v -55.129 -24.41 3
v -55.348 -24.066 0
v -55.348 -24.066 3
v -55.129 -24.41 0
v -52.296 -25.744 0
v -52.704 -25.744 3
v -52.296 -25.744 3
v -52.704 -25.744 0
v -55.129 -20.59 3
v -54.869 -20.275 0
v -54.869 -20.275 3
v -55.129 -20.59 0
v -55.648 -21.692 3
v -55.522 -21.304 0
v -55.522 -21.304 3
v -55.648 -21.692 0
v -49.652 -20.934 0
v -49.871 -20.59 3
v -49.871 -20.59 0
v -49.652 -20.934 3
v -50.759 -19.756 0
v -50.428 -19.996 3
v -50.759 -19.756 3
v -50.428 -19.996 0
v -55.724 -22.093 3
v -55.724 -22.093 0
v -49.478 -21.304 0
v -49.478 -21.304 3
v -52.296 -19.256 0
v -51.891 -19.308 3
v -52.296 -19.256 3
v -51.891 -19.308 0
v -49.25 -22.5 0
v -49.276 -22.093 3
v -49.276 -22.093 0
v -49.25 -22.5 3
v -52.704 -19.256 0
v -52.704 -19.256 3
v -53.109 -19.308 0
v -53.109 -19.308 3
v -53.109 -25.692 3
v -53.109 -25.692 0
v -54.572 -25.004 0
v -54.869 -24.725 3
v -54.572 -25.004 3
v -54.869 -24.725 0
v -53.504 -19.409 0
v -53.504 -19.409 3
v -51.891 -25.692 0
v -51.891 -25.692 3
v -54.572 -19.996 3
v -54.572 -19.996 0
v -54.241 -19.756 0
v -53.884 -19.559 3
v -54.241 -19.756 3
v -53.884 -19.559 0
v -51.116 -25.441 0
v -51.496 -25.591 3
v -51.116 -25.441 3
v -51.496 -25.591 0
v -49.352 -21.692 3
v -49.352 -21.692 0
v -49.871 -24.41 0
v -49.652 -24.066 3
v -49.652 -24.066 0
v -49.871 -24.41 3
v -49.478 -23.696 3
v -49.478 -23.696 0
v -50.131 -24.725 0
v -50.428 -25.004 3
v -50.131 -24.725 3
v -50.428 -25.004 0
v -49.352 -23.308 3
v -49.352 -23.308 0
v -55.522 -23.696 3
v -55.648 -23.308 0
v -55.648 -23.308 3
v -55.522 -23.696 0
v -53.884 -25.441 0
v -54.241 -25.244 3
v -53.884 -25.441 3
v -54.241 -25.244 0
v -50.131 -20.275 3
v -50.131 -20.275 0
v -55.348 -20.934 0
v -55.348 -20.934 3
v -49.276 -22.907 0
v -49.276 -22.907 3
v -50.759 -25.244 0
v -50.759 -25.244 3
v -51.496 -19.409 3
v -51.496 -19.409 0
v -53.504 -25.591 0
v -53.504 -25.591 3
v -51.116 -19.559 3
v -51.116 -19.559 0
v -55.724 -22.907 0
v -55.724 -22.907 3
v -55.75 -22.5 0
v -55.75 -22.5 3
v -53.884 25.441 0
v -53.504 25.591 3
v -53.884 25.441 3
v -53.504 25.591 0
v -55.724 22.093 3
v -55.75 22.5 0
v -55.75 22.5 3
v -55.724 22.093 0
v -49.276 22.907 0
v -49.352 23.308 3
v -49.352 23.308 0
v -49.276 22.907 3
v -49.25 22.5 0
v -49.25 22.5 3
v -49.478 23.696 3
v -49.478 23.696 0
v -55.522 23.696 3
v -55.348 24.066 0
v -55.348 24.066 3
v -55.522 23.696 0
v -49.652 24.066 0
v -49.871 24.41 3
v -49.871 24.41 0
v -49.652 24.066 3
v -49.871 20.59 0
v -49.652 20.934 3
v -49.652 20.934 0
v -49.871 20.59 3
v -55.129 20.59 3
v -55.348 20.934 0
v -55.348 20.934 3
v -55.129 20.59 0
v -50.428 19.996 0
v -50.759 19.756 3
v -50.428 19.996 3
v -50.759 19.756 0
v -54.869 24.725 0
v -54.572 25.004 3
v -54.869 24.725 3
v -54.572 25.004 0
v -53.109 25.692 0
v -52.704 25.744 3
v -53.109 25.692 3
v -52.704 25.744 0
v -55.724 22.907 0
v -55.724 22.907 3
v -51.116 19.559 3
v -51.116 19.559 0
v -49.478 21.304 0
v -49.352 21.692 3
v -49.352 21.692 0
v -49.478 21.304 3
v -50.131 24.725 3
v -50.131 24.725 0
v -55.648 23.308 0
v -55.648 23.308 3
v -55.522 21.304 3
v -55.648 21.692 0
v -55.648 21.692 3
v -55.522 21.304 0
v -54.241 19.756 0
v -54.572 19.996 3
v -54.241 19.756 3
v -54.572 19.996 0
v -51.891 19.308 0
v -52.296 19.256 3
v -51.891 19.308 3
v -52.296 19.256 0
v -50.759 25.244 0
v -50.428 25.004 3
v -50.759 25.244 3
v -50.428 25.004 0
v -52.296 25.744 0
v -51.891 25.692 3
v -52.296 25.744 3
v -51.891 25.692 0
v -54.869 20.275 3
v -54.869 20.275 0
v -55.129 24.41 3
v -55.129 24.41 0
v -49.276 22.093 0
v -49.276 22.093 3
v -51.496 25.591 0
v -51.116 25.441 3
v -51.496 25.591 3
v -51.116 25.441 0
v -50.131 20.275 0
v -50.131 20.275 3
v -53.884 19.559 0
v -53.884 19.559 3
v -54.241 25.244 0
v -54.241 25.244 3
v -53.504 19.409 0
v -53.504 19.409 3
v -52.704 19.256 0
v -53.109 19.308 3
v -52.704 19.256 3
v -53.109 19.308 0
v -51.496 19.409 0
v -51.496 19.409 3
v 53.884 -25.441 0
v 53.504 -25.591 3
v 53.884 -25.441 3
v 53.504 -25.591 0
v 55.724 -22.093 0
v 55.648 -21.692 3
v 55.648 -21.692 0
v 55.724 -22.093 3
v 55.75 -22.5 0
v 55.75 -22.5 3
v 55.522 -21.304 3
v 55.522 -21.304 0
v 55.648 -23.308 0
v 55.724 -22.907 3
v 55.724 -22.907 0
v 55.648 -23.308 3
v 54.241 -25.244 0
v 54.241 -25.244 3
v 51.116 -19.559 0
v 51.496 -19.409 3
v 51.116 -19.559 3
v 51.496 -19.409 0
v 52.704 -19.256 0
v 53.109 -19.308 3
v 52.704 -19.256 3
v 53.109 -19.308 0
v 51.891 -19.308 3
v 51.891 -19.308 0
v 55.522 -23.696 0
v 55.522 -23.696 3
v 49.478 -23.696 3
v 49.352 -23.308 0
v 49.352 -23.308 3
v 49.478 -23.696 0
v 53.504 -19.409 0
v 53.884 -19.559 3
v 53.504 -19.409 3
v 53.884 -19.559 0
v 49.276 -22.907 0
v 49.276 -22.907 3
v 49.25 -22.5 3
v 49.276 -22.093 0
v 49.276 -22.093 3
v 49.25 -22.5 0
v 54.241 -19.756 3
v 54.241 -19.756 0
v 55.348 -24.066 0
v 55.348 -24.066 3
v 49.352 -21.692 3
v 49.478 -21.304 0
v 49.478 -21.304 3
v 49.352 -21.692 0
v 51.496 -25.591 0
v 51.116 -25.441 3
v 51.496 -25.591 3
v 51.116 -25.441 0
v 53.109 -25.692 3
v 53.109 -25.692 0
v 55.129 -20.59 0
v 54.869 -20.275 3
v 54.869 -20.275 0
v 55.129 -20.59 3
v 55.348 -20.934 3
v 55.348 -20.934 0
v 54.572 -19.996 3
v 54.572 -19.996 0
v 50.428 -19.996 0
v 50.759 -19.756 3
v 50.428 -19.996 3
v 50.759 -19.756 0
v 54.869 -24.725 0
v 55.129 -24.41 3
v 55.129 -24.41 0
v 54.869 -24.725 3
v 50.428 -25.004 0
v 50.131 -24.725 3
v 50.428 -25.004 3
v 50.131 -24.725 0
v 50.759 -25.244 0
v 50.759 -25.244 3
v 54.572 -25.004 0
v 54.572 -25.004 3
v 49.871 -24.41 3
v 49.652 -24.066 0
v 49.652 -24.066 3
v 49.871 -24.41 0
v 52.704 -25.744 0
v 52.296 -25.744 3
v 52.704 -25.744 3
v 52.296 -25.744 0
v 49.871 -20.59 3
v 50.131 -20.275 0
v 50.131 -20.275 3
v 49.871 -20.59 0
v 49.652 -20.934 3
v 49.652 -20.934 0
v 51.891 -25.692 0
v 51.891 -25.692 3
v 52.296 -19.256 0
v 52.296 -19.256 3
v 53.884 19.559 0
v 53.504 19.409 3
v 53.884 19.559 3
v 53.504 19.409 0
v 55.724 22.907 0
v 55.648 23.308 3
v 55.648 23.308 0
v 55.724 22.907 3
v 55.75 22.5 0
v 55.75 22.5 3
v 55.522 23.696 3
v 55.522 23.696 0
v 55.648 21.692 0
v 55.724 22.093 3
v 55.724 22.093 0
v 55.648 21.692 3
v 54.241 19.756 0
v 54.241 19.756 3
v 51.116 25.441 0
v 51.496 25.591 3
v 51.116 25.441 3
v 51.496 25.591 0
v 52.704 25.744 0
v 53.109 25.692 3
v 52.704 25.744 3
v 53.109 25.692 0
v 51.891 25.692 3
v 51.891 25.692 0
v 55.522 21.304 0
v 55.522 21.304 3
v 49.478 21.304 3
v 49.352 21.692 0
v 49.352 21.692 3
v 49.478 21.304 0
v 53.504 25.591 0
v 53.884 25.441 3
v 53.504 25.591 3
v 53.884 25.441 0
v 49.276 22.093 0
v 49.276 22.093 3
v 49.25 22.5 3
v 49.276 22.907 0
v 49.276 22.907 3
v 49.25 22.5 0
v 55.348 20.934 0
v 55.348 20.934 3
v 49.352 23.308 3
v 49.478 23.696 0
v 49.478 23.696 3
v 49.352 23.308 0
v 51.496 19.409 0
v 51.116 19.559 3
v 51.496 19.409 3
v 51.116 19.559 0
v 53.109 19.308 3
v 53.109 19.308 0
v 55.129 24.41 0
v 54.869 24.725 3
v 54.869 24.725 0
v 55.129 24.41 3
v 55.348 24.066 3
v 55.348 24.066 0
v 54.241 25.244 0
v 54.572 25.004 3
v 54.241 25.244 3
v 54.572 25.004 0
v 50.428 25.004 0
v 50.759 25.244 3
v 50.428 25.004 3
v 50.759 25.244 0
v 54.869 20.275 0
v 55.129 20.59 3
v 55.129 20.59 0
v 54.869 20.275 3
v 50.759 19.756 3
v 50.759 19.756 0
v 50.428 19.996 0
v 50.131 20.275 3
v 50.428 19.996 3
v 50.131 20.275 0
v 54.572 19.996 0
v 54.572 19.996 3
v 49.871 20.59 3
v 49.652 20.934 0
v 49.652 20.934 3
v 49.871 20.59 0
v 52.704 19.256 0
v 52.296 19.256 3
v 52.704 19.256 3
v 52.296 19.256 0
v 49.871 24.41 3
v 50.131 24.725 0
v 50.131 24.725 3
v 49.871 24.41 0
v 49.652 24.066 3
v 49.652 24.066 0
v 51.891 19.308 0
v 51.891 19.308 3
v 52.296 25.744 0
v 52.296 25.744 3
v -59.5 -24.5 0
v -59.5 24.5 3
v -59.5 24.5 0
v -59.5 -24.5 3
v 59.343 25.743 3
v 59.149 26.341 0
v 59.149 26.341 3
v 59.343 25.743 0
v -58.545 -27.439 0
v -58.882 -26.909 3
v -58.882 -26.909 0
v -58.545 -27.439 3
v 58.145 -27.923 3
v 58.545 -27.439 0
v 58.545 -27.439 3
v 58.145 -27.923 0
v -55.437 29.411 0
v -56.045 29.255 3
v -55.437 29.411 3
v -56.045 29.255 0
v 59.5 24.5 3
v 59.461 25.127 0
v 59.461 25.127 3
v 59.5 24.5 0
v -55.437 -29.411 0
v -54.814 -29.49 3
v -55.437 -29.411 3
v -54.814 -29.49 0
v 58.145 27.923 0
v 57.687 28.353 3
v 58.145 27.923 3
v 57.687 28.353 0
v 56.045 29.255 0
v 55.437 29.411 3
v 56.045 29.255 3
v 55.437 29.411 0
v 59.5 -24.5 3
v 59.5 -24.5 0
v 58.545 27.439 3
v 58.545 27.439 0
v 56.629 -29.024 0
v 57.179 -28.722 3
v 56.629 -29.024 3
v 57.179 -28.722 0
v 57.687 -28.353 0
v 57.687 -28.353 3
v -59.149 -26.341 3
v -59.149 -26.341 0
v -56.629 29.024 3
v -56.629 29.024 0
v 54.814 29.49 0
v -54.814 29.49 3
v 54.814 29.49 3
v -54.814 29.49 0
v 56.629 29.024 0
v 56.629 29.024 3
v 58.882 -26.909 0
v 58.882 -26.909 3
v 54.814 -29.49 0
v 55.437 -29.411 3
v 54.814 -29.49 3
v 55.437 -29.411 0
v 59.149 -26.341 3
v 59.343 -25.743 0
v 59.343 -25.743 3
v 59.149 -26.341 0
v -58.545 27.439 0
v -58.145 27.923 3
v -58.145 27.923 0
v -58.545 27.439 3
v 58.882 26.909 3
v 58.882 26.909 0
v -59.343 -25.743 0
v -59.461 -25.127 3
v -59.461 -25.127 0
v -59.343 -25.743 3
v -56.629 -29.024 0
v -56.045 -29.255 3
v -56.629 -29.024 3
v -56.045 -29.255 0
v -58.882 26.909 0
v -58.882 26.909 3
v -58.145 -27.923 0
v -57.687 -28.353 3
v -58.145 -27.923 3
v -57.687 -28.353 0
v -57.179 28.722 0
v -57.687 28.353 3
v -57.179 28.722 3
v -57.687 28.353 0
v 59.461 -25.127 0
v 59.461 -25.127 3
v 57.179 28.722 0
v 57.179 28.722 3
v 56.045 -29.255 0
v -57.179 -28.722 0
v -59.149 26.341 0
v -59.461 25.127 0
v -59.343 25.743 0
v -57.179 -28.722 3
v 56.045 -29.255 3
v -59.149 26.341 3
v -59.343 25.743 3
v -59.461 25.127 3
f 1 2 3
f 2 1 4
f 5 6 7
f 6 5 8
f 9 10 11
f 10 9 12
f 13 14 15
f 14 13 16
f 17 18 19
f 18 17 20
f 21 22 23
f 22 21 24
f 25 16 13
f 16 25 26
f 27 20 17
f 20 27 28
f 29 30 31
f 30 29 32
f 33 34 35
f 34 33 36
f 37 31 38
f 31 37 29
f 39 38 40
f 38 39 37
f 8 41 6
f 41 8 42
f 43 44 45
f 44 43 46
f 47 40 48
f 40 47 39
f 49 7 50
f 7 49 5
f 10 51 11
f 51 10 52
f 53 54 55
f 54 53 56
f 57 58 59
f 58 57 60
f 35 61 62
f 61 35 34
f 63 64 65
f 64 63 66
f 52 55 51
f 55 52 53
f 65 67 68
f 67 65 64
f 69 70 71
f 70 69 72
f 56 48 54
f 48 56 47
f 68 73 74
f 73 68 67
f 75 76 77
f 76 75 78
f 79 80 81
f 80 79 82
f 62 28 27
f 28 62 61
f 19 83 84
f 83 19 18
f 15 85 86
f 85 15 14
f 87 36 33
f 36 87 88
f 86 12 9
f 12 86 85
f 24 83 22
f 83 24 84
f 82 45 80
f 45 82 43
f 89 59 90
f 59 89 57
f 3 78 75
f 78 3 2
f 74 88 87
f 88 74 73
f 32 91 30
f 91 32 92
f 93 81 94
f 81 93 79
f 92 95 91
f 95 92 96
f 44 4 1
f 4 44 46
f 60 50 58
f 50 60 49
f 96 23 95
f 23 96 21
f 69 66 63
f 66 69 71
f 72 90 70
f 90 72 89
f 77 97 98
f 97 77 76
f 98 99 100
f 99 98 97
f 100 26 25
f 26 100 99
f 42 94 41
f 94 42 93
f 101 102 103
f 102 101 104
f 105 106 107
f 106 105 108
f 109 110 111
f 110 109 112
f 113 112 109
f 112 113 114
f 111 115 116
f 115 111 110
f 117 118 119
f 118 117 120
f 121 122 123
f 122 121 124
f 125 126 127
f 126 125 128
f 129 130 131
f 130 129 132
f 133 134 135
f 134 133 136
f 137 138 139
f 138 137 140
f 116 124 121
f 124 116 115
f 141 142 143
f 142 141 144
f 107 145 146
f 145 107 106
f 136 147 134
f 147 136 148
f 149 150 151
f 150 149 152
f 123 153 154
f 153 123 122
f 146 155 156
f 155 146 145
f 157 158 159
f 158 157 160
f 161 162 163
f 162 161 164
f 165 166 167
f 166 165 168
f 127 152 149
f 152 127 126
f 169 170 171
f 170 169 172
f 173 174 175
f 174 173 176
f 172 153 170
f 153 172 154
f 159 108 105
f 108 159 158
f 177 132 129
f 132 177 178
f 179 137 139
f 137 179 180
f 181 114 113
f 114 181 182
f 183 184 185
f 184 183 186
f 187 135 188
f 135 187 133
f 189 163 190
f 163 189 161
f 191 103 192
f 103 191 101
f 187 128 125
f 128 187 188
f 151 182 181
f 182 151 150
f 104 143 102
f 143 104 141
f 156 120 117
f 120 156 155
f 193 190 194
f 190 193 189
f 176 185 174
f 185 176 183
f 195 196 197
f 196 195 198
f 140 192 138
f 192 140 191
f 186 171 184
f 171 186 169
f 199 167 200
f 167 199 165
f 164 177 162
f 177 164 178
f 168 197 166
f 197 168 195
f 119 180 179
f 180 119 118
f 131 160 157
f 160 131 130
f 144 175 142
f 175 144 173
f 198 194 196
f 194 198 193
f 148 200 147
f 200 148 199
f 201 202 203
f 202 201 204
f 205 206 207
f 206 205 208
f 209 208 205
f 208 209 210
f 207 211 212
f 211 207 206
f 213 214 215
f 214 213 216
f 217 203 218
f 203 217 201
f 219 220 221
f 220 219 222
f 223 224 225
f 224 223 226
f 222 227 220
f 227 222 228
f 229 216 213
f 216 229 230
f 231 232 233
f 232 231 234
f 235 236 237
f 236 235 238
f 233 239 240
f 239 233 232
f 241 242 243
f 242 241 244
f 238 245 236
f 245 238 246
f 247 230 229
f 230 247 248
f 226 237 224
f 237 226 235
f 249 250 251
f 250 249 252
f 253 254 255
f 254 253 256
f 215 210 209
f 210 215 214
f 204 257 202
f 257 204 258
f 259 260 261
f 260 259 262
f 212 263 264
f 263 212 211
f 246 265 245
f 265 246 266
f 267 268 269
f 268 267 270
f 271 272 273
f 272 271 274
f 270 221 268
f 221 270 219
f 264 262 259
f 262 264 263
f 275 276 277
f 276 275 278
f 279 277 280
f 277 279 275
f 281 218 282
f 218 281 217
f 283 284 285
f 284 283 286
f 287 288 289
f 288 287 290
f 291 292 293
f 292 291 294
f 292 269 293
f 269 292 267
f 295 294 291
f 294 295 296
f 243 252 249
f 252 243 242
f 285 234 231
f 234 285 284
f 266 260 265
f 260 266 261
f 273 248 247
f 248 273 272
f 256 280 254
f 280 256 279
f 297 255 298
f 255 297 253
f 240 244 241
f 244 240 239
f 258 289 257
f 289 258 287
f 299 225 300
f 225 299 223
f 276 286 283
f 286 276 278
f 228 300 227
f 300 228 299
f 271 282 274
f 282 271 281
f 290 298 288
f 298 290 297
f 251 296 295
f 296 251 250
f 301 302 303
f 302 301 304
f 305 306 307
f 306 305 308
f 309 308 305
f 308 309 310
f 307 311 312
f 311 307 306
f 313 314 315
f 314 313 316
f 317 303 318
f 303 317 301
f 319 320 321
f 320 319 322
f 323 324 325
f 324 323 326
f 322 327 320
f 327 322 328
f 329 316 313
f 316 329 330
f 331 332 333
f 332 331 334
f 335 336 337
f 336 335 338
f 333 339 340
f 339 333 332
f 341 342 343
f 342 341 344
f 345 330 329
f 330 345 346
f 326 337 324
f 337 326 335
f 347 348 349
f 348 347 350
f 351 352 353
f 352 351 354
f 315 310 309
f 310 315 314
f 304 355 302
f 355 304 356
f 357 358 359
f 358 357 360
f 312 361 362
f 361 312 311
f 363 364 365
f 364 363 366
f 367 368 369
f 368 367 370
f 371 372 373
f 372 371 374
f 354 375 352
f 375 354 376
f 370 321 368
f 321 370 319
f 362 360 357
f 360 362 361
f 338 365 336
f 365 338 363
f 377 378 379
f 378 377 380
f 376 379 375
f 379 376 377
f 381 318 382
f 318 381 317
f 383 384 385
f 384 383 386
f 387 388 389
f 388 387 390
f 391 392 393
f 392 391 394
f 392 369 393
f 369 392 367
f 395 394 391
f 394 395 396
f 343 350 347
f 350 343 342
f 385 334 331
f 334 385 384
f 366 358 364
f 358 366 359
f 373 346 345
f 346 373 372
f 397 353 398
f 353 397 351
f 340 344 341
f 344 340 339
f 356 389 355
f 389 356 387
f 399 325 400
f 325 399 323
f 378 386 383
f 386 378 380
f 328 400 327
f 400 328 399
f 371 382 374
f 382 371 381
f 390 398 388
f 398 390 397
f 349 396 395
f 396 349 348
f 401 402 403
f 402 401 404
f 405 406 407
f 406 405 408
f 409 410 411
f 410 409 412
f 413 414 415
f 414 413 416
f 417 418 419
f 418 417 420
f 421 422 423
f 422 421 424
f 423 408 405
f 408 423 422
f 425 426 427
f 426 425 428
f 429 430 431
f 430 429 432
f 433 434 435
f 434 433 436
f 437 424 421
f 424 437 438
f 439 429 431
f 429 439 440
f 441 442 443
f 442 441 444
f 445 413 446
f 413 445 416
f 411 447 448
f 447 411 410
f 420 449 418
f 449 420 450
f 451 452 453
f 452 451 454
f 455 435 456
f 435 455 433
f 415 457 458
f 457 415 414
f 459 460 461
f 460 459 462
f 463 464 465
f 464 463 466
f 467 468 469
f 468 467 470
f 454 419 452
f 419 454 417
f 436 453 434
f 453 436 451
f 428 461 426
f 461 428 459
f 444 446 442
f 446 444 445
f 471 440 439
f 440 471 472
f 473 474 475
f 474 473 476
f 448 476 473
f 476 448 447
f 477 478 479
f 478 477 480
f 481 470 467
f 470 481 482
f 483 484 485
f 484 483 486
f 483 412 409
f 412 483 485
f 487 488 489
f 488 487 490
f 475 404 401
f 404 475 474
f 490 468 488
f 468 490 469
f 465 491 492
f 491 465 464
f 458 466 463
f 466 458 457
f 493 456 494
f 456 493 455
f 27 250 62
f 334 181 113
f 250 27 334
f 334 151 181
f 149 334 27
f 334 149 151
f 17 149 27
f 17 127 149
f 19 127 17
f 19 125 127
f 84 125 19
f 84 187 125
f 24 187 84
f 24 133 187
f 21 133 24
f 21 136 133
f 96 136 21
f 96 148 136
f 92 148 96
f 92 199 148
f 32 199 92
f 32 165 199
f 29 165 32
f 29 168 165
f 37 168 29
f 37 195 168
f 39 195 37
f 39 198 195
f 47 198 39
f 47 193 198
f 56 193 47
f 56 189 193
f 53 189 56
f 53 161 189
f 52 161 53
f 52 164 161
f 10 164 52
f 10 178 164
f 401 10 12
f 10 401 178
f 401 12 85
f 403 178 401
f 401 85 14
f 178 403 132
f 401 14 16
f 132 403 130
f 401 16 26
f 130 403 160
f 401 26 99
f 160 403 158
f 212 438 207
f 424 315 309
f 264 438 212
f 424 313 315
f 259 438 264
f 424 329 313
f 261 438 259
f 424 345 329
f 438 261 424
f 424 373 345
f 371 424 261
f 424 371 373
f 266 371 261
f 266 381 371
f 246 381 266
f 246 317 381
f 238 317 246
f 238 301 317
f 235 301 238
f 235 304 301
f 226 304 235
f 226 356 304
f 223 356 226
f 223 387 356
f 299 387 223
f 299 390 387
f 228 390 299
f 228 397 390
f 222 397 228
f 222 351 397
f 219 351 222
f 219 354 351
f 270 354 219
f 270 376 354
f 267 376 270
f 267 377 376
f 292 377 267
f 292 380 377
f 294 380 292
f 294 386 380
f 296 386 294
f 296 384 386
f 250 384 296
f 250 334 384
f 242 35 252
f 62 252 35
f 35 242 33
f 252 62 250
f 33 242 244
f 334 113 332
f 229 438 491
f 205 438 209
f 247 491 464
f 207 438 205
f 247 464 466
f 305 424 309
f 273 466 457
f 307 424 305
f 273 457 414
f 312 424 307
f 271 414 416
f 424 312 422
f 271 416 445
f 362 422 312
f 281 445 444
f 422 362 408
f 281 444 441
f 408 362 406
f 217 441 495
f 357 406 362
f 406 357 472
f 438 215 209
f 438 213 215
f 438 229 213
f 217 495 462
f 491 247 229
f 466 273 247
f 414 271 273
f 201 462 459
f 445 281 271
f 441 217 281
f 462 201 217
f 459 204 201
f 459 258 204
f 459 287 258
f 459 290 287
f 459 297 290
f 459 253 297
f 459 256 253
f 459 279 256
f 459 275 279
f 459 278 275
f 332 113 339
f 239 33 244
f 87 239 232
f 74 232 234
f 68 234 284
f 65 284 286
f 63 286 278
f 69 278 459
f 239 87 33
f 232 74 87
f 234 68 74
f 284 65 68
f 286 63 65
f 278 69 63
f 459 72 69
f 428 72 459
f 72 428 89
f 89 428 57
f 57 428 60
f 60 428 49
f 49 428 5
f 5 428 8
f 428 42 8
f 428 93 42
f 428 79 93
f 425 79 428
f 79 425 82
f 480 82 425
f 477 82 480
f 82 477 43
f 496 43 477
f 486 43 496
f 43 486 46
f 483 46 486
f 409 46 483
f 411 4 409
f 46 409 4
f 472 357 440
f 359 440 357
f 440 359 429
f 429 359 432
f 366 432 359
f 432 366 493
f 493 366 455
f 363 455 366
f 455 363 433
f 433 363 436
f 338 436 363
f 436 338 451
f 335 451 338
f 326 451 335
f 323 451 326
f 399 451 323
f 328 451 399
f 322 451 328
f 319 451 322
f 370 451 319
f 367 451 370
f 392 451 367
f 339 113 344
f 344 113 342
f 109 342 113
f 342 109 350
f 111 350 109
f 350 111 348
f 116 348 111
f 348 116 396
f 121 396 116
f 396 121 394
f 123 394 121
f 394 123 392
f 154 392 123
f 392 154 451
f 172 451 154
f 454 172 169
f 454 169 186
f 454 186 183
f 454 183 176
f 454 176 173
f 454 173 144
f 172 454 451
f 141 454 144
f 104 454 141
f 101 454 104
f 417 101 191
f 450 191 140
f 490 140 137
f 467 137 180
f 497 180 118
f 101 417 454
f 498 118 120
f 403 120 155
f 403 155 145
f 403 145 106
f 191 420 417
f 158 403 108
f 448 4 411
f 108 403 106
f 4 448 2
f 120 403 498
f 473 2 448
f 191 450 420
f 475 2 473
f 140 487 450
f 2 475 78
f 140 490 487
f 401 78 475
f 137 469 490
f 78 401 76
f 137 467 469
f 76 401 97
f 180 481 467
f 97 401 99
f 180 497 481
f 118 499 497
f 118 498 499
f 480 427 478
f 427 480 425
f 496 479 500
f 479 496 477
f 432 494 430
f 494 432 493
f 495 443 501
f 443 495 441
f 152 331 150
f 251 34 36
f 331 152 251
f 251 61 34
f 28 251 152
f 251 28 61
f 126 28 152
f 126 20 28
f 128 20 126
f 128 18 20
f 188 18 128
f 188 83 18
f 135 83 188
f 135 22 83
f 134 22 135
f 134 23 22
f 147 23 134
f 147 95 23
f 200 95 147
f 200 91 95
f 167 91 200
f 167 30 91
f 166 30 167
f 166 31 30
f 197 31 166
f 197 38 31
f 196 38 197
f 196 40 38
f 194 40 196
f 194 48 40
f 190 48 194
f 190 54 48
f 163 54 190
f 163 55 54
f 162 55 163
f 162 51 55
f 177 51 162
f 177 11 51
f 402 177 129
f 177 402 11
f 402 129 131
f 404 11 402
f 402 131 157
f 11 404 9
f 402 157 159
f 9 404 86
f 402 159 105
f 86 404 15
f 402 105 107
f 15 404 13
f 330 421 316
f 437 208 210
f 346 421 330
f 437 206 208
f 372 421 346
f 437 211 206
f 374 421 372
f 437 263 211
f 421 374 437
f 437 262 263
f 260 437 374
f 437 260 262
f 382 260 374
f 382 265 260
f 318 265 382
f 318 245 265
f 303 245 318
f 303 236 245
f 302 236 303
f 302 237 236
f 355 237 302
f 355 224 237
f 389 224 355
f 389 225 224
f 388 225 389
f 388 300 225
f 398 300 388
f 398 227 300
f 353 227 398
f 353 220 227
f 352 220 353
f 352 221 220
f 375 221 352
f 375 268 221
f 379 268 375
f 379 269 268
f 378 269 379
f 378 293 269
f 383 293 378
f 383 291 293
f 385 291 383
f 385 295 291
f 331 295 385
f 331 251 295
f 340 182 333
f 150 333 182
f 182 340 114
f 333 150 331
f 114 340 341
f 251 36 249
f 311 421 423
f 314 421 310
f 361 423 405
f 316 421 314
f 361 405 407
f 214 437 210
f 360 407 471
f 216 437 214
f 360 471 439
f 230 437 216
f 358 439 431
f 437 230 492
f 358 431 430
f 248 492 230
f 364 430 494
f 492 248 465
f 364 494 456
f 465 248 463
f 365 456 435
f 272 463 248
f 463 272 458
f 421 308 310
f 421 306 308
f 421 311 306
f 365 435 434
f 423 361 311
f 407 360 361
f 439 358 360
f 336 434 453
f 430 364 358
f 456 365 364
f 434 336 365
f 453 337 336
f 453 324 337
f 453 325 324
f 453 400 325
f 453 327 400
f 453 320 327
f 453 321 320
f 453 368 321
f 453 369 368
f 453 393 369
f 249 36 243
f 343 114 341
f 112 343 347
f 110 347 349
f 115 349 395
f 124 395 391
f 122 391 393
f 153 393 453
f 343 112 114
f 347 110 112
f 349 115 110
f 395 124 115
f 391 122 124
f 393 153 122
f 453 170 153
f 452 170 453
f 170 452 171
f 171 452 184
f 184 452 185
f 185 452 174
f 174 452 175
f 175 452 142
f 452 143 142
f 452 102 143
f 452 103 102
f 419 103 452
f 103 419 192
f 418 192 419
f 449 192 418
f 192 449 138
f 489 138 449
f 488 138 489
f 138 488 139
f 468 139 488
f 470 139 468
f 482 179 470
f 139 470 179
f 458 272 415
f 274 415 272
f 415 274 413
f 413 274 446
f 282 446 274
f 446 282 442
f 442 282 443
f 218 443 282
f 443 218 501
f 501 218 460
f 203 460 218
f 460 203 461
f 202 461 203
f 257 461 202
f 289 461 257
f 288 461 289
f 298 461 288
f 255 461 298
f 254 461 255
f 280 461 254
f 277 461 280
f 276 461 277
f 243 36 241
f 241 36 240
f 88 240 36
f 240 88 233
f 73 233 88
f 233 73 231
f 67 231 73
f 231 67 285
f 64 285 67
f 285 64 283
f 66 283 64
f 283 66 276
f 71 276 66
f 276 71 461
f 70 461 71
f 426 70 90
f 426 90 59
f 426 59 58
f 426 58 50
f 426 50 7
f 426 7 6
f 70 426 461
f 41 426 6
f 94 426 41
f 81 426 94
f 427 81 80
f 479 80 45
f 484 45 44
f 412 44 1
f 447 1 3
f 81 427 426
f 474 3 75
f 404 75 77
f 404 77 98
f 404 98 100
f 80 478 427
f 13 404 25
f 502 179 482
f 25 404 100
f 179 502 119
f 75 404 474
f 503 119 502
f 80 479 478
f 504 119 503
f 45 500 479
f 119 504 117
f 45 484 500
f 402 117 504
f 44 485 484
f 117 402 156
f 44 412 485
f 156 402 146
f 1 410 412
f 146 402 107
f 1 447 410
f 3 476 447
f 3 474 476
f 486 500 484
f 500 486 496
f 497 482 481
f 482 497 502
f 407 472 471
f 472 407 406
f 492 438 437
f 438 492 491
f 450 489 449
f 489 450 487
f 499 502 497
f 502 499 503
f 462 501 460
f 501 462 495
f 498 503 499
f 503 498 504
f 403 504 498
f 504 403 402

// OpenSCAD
$fn = 50;


difference() {
	union() {
		hull() {
			translate(v = [-54.5000000000, 24.5000000000, 0]) {
				cylinder(h = 3, r = 5);
			}
			translate(v = [54.5000000000, 24.5000000000, 0]) {
				cylinder(h = 3, r = 5);
			}
			translate(v = [-54.5000000000, -24.5000000000, 0]) {
				cylinder(h = 3, r = 5);
			}
			translate(v = [54.5000000000, -24.5000000000, 0]) {
				cylinder(h = 3, r = 5);
			}
		}
	}
	union() {
		translate(v = [-52.5000000000, -22.5000000000, -100.0000000000]) {
			cylinder(h = 200, r = 3.2500000000);
		}
		translate(v = [-52.5000000000, 22.5000000000, -100.0000000000]) {
			cylinder(h = 200, r = 3.2500000000);
		}
		translate(v = [52.5000000000, -22.5000000000, -100.0000000000]) {
			cylinder(h = 200, r = 3.2500000000);
		}
		translate(v = [52.5000000000, 22.5000000000, -100.0000000000]) {
			cylinder(h = 200, r = 3.2500000000);
		}
	}
}
